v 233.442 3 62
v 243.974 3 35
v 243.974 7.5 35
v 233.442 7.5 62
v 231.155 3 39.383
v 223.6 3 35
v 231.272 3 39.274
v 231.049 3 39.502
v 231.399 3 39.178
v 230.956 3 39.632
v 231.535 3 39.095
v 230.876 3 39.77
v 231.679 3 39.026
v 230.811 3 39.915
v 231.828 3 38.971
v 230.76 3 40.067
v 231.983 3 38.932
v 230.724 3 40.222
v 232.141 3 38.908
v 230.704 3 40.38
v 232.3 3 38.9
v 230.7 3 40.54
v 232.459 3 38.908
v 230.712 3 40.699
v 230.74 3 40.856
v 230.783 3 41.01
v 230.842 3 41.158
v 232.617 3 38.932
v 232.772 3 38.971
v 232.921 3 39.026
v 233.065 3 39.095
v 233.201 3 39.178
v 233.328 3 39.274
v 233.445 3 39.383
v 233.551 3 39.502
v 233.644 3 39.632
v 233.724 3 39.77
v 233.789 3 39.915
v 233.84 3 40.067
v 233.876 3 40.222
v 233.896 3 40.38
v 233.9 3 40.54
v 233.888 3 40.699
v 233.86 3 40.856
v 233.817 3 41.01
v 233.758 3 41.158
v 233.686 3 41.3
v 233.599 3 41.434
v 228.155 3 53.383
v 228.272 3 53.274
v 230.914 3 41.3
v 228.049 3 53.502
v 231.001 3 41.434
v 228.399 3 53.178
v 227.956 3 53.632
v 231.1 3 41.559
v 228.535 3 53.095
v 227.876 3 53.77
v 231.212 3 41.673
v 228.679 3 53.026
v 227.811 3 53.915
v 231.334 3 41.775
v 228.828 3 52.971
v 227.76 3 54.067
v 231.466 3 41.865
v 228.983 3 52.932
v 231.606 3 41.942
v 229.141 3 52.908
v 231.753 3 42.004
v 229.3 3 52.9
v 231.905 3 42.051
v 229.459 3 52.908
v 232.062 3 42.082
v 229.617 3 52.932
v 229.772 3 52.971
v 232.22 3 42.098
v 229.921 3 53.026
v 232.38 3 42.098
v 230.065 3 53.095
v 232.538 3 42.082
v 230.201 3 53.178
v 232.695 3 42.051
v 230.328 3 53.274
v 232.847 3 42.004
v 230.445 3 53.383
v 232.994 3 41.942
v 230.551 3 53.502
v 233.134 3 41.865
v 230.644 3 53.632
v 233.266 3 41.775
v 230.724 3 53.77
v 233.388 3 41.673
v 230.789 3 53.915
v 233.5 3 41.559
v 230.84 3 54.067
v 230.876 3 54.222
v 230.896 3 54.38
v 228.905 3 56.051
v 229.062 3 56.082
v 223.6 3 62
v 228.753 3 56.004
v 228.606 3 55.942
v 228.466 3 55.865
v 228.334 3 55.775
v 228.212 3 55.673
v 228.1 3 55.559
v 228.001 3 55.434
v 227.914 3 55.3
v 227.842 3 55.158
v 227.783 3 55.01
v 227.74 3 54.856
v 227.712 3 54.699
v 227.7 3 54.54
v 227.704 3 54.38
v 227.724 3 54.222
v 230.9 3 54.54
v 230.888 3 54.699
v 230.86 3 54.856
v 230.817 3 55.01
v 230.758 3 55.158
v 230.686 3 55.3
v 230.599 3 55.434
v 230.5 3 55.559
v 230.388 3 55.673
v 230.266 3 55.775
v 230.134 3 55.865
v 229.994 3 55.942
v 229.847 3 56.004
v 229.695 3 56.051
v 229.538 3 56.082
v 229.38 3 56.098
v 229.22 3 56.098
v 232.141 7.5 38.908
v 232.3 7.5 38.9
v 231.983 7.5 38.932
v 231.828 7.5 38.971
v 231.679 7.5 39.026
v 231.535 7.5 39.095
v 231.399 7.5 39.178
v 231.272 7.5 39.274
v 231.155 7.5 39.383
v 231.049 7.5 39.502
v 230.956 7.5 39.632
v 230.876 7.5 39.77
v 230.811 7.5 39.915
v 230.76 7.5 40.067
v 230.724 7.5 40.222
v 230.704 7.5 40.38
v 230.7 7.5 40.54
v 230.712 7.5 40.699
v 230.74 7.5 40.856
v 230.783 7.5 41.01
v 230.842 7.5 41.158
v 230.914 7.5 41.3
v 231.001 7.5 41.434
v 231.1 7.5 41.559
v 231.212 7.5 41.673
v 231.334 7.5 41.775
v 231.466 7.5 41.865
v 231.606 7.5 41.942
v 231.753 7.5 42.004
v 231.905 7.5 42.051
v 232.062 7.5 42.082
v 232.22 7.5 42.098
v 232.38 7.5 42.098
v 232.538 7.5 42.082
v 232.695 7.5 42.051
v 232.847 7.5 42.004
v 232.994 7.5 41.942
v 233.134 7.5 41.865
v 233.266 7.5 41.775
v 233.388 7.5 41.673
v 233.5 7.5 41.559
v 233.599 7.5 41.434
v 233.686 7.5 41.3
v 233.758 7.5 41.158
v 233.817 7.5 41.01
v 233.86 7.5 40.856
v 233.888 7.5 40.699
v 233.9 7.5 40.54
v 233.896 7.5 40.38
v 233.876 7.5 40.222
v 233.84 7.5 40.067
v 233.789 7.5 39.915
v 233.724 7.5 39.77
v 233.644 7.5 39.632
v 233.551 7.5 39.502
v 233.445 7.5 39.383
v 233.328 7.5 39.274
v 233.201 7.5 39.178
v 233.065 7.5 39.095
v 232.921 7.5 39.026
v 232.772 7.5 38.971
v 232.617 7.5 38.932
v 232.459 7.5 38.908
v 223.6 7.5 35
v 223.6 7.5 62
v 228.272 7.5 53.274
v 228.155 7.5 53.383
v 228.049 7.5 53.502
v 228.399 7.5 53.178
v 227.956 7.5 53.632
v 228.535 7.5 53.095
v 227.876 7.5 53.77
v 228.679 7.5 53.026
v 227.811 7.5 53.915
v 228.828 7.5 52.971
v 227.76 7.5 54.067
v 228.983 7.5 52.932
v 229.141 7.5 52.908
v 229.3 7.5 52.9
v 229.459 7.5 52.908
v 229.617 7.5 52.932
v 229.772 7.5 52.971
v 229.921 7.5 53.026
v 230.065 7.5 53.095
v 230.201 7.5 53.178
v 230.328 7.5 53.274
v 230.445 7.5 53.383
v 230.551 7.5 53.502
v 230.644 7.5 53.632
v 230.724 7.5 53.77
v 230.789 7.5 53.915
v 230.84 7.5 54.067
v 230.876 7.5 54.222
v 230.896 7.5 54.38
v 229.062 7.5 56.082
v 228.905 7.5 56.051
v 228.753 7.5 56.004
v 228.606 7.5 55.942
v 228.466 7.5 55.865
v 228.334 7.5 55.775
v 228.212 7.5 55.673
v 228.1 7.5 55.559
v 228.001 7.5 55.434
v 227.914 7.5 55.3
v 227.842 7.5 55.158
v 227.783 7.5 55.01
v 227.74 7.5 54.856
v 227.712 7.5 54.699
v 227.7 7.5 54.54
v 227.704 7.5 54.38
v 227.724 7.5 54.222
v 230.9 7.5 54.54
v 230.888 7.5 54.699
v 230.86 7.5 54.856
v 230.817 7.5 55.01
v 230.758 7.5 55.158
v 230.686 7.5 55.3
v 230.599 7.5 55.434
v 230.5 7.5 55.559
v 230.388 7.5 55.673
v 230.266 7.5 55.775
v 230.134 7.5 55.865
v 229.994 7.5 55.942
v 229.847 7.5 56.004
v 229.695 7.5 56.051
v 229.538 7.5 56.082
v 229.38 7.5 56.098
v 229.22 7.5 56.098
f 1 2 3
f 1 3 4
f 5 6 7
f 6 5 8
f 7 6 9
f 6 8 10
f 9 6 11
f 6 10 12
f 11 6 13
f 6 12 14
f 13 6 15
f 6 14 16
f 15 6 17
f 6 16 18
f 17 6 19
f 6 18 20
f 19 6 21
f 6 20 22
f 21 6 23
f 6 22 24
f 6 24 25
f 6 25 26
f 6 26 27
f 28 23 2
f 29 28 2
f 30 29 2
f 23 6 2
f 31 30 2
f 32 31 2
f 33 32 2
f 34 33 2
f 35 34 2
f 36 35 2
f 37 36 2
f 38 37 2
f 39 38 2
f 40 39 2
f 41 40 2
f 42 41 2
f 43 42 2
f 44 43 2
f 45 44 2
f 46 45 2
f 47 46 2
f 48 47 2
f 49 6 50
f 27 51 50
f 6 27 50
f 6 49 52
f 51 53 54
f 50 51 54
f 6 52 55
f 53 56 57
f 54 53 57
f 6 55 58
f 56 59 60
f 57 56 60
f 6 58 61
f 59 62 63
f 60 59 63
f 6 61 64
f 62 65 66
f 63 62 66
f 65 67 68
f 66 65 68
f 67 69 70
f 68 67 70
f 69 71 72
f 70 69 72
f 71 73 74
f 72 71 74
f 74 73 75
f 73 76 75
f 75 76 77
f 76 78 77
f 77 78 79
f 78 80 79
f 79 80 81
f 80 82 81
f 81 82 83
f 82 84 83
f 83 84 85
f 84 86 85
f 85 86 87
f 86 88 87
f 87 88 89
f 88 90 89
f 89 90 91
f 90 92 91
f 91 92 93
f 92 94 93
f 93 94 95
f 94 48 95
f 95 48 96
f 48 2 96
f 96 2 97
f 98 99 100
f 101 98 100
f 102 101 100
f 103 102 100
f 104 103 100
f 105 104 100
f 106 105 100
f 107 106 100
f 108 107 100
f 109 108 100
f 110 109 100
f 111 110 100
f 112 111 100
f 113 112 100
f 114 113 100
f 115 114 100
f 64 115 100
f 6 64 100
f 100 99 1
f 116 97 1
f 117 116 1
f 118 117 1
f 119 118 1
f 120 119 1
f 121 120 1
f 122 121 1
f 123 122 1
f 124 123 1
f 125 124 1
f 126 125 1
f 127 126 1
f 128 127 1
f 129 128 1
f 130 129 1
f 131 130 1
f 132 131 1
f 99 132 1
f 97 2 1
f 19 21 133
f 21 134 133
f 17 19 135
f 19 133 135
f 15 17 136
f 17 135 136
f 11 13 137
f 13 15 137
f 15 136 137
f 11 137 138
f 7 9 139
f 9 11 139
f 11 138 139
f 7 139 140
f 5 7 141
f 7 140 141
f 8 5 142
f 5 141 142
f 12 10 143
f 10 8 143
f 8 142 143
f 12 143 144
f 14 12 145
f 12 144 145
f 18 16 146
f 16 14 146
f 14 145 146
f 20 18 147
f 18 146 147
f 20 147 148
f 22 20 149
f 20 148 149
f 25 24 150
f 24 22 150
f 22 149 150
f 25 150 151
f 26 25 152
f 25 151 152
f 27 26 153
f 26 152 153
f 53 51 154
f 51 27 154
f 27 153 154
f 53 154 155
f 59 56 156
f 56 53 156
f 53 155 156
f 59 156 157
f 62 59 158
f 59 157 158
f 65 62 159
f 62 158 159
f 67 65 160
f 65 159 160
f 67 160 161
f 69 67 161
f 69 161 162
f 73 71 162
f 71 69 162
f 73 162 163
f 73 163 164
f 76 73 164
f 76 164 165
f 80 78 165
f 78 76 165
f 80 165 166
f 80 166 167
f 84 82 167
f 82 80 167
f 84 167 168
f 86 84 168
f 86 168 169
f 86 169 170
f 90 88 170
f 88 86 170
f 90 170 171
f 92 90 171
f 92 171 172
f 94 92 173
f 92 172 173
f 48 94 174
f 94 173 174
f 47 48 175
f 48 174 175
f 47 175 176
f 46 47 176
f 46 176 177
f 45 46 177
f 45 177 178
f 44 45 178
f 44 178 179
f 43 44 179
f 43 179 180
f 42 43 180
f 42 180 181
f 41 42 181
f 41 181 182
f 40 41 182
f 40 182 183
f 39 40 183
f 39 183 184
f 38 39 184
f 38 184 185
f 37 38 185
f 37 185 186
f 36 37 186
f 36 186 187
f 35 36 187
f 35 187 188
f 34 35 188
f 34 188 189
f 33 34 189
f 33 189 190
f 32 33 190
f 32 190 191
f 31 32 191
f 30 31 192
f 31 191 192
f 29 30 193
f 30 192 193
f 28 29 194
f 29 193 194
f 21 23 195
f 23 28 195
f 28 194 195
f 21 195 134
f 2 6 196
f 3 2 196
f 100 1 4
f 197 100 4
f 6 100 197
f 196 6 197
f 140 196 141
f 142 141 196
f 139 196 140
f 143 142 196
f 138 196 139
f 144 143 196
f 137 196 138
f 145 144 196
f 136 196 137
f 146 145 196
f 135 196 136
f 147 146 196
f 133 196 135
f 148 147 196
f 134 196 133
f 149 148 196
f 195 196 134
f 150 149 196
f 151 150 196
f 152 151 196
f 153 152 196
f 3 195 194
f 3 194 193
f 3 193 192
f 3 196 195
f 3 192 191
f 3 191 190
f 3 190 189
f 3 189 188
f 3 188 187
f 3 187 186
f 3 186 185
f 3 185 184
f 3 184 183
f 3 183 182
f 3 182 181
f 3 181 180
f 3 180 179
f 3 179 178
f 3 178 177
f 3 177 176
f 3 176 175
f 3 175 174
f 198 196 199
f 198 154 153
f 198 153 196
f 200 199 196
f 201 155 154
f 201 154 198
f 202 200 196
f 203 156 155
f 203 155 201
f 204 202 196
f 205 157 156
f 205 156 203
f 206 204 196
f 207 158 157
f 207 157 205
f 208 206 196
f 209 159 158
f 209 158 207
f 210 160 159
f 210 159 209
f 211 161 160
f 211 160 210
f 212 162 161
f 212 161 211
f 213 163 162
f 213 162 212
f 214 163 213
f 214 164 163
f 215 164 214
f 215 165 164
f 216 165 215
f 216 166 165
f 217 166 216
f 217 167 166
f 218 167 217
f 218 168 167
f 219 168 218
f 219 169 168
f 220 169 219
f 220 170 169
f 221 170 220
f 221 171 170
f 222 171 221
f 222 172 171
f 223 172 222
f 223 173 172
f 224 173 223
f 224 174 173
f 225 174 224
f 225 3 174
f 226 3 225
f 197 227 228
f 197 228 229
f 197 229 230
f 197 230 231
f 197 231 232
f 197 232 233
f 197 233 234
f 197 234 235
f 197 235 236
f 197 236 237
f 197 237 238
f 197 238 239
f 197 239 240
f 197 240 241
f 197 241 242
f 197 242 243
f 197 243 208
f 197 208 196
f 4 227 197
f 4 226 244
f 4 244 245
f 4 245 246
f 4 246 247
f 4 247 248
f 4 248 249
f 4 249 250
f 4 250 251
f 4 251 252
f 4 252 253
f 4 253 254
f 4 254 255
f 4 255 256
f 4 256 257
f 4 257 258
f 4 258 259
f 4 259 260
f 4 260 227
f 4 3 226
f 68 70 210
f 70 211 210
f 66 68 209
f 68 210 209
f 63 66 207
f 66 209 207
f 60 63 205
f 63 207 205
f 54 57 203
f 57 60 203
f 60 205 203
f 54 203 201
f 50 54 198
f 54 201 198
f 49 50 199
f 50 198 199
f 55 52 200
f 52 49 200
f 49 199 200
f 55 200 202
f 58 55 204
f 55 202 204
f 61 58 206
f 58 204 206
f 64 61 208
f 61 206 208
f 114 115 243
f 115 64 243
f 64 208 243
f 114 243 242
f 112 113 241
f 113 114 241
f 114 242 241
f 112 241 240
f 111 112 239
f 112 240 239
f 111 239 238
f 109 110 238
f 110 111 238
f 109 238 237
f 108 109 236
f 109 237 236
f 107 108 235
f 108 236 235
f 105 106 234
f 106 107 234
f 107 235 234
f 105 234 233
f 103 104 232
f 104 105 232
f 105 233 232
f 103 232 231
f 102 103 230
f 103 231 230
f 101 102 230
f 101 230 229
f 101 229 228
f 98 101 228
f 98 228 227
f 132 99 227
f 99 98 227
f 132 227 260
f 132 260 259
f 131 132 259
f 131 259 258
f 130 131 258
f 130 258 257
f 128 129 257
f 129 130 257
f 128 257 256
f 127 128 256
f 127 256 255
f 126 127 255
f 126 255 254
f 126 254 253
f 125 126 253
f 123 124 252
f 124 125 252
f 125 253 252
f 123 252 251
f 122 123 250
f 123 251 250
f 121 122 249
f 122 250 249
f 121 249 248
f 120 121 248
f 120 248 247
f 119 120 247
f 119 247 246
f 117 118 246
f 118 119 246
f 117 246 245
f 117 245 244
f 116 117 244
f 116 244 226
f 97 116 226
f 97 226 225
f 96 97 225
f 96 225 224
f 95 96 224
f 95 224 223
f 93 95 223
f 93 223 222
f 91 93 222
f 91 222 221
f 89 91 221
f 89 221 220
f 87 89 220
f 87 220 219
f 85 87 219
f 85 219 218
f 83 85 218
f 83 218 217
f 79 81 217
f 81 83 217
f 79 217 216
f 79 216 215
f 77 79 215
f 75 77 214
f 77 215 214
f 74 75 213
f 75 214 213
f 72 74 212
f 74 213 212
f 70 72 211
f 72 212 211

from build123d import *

# Parameters (mm, degrees)
CYLINDER125_R                     = 1.6
CYLINDER125_DEPTH                 = 40
CYLINDER126_R                     = 1.6
CYLINDER126_DEPTH                 = 40
EXTRUDE051_DEPTH                  = 10
SKETCH042_W                       = 4.5
SKETCH042_H                       = 27
EXTRUDE052_DEPTH                  = 21
PART_MIRRORING001_PLACEMENT_ANGLE = 180


with BuildPart() as cylinder125:
    # Cylinder125 → Cylinder125 (new body)
    with BuildSketch(Plane(origin=(5.3, 42, 40.5), x_dir=(0, 0, -1), z_dir=(0, -1, 0))):
        Circle(CYLINDER125_R)
    extrude(amount=CYLINDER125_DEPTH)


with BuildPart() as cylinder126:
    # Cylinder126 → Cylinder126 (new body)
    with BuildSketch(Plane(origin=(8.3, 42, 54.5), x_dir=(0, 0, -1), z_dir=(0, -1, 0))):
        Circle(CYLINDER126_R)
    extrude(amount=CYLINDER126_DEPTH)


with BuildPart() as extrude051:
    # Sketch041 → Extrude051 (new body)
    with BuildSketch(Plane.XZ):
        Polygon((-8.16038, 62.64716), (-8.16038, 30.419451), (4.410427, 62.64716), align=None)
    extrude(amount=-EXTRUDE051_DEPTH)


with BuildPart() as extrude051_1:
    # Extrude051 placement: moved
    add(extrude051.part.moved(Location((0, 8, 0))))


with BuildPart() as cut134:
    # Sketch042 → Extrude052 (new body)
    with BuildSketch(Plane.YZ):
        with Locations((12.25, 48.5)):
            Rectangle(SKETCH042_W, SKETCH042_H)
    extrude(amount=EXTRUDE052_DEPTH)


with BuildPart() as cut134_1:
    # Extrude052 placement: moved
    add(cut134.part.moved(Location((-7, 0, 0))))

    # Cut128: cut Extrude051
    add(extrude051_1.part, mode=Mode.SUBTRACT)


with BuildPart() as cut134_2:
    # Cut128 placement: moved
    add(cut134_1.part.moved(Location((0, -7, 0))))

    # Cut133: cut Cylinder126
    add(cylinder126.part, mode=Mode.SUBTRACT)

    # Cut134: cut Cylinder125
    add(cylinder125.part, mode=Mode.SUBTRACT)


with BuildPart() as part_mirroring001:
    # Part__Mirroring001: instance of Cut134
    add(cut134_2.part.mirror(Plane(origin=(3.813159, 4e-06, 48.5), x_dir=(1, 0, 0), z_dir=(0, 1, 0))))


with BuildPart() as part_mirroring001_1:
    # Part__Mirroring001 placement: moved
    add(part_mirroring001.part.moved(Location((237.6, 0, 0))).rotate(Axis((237.6, 0, 0), (0, 0, 1)), PART_MIRRORING001_PLACEMENT_ANGLE))


solid = part_mirroring001_1.part
